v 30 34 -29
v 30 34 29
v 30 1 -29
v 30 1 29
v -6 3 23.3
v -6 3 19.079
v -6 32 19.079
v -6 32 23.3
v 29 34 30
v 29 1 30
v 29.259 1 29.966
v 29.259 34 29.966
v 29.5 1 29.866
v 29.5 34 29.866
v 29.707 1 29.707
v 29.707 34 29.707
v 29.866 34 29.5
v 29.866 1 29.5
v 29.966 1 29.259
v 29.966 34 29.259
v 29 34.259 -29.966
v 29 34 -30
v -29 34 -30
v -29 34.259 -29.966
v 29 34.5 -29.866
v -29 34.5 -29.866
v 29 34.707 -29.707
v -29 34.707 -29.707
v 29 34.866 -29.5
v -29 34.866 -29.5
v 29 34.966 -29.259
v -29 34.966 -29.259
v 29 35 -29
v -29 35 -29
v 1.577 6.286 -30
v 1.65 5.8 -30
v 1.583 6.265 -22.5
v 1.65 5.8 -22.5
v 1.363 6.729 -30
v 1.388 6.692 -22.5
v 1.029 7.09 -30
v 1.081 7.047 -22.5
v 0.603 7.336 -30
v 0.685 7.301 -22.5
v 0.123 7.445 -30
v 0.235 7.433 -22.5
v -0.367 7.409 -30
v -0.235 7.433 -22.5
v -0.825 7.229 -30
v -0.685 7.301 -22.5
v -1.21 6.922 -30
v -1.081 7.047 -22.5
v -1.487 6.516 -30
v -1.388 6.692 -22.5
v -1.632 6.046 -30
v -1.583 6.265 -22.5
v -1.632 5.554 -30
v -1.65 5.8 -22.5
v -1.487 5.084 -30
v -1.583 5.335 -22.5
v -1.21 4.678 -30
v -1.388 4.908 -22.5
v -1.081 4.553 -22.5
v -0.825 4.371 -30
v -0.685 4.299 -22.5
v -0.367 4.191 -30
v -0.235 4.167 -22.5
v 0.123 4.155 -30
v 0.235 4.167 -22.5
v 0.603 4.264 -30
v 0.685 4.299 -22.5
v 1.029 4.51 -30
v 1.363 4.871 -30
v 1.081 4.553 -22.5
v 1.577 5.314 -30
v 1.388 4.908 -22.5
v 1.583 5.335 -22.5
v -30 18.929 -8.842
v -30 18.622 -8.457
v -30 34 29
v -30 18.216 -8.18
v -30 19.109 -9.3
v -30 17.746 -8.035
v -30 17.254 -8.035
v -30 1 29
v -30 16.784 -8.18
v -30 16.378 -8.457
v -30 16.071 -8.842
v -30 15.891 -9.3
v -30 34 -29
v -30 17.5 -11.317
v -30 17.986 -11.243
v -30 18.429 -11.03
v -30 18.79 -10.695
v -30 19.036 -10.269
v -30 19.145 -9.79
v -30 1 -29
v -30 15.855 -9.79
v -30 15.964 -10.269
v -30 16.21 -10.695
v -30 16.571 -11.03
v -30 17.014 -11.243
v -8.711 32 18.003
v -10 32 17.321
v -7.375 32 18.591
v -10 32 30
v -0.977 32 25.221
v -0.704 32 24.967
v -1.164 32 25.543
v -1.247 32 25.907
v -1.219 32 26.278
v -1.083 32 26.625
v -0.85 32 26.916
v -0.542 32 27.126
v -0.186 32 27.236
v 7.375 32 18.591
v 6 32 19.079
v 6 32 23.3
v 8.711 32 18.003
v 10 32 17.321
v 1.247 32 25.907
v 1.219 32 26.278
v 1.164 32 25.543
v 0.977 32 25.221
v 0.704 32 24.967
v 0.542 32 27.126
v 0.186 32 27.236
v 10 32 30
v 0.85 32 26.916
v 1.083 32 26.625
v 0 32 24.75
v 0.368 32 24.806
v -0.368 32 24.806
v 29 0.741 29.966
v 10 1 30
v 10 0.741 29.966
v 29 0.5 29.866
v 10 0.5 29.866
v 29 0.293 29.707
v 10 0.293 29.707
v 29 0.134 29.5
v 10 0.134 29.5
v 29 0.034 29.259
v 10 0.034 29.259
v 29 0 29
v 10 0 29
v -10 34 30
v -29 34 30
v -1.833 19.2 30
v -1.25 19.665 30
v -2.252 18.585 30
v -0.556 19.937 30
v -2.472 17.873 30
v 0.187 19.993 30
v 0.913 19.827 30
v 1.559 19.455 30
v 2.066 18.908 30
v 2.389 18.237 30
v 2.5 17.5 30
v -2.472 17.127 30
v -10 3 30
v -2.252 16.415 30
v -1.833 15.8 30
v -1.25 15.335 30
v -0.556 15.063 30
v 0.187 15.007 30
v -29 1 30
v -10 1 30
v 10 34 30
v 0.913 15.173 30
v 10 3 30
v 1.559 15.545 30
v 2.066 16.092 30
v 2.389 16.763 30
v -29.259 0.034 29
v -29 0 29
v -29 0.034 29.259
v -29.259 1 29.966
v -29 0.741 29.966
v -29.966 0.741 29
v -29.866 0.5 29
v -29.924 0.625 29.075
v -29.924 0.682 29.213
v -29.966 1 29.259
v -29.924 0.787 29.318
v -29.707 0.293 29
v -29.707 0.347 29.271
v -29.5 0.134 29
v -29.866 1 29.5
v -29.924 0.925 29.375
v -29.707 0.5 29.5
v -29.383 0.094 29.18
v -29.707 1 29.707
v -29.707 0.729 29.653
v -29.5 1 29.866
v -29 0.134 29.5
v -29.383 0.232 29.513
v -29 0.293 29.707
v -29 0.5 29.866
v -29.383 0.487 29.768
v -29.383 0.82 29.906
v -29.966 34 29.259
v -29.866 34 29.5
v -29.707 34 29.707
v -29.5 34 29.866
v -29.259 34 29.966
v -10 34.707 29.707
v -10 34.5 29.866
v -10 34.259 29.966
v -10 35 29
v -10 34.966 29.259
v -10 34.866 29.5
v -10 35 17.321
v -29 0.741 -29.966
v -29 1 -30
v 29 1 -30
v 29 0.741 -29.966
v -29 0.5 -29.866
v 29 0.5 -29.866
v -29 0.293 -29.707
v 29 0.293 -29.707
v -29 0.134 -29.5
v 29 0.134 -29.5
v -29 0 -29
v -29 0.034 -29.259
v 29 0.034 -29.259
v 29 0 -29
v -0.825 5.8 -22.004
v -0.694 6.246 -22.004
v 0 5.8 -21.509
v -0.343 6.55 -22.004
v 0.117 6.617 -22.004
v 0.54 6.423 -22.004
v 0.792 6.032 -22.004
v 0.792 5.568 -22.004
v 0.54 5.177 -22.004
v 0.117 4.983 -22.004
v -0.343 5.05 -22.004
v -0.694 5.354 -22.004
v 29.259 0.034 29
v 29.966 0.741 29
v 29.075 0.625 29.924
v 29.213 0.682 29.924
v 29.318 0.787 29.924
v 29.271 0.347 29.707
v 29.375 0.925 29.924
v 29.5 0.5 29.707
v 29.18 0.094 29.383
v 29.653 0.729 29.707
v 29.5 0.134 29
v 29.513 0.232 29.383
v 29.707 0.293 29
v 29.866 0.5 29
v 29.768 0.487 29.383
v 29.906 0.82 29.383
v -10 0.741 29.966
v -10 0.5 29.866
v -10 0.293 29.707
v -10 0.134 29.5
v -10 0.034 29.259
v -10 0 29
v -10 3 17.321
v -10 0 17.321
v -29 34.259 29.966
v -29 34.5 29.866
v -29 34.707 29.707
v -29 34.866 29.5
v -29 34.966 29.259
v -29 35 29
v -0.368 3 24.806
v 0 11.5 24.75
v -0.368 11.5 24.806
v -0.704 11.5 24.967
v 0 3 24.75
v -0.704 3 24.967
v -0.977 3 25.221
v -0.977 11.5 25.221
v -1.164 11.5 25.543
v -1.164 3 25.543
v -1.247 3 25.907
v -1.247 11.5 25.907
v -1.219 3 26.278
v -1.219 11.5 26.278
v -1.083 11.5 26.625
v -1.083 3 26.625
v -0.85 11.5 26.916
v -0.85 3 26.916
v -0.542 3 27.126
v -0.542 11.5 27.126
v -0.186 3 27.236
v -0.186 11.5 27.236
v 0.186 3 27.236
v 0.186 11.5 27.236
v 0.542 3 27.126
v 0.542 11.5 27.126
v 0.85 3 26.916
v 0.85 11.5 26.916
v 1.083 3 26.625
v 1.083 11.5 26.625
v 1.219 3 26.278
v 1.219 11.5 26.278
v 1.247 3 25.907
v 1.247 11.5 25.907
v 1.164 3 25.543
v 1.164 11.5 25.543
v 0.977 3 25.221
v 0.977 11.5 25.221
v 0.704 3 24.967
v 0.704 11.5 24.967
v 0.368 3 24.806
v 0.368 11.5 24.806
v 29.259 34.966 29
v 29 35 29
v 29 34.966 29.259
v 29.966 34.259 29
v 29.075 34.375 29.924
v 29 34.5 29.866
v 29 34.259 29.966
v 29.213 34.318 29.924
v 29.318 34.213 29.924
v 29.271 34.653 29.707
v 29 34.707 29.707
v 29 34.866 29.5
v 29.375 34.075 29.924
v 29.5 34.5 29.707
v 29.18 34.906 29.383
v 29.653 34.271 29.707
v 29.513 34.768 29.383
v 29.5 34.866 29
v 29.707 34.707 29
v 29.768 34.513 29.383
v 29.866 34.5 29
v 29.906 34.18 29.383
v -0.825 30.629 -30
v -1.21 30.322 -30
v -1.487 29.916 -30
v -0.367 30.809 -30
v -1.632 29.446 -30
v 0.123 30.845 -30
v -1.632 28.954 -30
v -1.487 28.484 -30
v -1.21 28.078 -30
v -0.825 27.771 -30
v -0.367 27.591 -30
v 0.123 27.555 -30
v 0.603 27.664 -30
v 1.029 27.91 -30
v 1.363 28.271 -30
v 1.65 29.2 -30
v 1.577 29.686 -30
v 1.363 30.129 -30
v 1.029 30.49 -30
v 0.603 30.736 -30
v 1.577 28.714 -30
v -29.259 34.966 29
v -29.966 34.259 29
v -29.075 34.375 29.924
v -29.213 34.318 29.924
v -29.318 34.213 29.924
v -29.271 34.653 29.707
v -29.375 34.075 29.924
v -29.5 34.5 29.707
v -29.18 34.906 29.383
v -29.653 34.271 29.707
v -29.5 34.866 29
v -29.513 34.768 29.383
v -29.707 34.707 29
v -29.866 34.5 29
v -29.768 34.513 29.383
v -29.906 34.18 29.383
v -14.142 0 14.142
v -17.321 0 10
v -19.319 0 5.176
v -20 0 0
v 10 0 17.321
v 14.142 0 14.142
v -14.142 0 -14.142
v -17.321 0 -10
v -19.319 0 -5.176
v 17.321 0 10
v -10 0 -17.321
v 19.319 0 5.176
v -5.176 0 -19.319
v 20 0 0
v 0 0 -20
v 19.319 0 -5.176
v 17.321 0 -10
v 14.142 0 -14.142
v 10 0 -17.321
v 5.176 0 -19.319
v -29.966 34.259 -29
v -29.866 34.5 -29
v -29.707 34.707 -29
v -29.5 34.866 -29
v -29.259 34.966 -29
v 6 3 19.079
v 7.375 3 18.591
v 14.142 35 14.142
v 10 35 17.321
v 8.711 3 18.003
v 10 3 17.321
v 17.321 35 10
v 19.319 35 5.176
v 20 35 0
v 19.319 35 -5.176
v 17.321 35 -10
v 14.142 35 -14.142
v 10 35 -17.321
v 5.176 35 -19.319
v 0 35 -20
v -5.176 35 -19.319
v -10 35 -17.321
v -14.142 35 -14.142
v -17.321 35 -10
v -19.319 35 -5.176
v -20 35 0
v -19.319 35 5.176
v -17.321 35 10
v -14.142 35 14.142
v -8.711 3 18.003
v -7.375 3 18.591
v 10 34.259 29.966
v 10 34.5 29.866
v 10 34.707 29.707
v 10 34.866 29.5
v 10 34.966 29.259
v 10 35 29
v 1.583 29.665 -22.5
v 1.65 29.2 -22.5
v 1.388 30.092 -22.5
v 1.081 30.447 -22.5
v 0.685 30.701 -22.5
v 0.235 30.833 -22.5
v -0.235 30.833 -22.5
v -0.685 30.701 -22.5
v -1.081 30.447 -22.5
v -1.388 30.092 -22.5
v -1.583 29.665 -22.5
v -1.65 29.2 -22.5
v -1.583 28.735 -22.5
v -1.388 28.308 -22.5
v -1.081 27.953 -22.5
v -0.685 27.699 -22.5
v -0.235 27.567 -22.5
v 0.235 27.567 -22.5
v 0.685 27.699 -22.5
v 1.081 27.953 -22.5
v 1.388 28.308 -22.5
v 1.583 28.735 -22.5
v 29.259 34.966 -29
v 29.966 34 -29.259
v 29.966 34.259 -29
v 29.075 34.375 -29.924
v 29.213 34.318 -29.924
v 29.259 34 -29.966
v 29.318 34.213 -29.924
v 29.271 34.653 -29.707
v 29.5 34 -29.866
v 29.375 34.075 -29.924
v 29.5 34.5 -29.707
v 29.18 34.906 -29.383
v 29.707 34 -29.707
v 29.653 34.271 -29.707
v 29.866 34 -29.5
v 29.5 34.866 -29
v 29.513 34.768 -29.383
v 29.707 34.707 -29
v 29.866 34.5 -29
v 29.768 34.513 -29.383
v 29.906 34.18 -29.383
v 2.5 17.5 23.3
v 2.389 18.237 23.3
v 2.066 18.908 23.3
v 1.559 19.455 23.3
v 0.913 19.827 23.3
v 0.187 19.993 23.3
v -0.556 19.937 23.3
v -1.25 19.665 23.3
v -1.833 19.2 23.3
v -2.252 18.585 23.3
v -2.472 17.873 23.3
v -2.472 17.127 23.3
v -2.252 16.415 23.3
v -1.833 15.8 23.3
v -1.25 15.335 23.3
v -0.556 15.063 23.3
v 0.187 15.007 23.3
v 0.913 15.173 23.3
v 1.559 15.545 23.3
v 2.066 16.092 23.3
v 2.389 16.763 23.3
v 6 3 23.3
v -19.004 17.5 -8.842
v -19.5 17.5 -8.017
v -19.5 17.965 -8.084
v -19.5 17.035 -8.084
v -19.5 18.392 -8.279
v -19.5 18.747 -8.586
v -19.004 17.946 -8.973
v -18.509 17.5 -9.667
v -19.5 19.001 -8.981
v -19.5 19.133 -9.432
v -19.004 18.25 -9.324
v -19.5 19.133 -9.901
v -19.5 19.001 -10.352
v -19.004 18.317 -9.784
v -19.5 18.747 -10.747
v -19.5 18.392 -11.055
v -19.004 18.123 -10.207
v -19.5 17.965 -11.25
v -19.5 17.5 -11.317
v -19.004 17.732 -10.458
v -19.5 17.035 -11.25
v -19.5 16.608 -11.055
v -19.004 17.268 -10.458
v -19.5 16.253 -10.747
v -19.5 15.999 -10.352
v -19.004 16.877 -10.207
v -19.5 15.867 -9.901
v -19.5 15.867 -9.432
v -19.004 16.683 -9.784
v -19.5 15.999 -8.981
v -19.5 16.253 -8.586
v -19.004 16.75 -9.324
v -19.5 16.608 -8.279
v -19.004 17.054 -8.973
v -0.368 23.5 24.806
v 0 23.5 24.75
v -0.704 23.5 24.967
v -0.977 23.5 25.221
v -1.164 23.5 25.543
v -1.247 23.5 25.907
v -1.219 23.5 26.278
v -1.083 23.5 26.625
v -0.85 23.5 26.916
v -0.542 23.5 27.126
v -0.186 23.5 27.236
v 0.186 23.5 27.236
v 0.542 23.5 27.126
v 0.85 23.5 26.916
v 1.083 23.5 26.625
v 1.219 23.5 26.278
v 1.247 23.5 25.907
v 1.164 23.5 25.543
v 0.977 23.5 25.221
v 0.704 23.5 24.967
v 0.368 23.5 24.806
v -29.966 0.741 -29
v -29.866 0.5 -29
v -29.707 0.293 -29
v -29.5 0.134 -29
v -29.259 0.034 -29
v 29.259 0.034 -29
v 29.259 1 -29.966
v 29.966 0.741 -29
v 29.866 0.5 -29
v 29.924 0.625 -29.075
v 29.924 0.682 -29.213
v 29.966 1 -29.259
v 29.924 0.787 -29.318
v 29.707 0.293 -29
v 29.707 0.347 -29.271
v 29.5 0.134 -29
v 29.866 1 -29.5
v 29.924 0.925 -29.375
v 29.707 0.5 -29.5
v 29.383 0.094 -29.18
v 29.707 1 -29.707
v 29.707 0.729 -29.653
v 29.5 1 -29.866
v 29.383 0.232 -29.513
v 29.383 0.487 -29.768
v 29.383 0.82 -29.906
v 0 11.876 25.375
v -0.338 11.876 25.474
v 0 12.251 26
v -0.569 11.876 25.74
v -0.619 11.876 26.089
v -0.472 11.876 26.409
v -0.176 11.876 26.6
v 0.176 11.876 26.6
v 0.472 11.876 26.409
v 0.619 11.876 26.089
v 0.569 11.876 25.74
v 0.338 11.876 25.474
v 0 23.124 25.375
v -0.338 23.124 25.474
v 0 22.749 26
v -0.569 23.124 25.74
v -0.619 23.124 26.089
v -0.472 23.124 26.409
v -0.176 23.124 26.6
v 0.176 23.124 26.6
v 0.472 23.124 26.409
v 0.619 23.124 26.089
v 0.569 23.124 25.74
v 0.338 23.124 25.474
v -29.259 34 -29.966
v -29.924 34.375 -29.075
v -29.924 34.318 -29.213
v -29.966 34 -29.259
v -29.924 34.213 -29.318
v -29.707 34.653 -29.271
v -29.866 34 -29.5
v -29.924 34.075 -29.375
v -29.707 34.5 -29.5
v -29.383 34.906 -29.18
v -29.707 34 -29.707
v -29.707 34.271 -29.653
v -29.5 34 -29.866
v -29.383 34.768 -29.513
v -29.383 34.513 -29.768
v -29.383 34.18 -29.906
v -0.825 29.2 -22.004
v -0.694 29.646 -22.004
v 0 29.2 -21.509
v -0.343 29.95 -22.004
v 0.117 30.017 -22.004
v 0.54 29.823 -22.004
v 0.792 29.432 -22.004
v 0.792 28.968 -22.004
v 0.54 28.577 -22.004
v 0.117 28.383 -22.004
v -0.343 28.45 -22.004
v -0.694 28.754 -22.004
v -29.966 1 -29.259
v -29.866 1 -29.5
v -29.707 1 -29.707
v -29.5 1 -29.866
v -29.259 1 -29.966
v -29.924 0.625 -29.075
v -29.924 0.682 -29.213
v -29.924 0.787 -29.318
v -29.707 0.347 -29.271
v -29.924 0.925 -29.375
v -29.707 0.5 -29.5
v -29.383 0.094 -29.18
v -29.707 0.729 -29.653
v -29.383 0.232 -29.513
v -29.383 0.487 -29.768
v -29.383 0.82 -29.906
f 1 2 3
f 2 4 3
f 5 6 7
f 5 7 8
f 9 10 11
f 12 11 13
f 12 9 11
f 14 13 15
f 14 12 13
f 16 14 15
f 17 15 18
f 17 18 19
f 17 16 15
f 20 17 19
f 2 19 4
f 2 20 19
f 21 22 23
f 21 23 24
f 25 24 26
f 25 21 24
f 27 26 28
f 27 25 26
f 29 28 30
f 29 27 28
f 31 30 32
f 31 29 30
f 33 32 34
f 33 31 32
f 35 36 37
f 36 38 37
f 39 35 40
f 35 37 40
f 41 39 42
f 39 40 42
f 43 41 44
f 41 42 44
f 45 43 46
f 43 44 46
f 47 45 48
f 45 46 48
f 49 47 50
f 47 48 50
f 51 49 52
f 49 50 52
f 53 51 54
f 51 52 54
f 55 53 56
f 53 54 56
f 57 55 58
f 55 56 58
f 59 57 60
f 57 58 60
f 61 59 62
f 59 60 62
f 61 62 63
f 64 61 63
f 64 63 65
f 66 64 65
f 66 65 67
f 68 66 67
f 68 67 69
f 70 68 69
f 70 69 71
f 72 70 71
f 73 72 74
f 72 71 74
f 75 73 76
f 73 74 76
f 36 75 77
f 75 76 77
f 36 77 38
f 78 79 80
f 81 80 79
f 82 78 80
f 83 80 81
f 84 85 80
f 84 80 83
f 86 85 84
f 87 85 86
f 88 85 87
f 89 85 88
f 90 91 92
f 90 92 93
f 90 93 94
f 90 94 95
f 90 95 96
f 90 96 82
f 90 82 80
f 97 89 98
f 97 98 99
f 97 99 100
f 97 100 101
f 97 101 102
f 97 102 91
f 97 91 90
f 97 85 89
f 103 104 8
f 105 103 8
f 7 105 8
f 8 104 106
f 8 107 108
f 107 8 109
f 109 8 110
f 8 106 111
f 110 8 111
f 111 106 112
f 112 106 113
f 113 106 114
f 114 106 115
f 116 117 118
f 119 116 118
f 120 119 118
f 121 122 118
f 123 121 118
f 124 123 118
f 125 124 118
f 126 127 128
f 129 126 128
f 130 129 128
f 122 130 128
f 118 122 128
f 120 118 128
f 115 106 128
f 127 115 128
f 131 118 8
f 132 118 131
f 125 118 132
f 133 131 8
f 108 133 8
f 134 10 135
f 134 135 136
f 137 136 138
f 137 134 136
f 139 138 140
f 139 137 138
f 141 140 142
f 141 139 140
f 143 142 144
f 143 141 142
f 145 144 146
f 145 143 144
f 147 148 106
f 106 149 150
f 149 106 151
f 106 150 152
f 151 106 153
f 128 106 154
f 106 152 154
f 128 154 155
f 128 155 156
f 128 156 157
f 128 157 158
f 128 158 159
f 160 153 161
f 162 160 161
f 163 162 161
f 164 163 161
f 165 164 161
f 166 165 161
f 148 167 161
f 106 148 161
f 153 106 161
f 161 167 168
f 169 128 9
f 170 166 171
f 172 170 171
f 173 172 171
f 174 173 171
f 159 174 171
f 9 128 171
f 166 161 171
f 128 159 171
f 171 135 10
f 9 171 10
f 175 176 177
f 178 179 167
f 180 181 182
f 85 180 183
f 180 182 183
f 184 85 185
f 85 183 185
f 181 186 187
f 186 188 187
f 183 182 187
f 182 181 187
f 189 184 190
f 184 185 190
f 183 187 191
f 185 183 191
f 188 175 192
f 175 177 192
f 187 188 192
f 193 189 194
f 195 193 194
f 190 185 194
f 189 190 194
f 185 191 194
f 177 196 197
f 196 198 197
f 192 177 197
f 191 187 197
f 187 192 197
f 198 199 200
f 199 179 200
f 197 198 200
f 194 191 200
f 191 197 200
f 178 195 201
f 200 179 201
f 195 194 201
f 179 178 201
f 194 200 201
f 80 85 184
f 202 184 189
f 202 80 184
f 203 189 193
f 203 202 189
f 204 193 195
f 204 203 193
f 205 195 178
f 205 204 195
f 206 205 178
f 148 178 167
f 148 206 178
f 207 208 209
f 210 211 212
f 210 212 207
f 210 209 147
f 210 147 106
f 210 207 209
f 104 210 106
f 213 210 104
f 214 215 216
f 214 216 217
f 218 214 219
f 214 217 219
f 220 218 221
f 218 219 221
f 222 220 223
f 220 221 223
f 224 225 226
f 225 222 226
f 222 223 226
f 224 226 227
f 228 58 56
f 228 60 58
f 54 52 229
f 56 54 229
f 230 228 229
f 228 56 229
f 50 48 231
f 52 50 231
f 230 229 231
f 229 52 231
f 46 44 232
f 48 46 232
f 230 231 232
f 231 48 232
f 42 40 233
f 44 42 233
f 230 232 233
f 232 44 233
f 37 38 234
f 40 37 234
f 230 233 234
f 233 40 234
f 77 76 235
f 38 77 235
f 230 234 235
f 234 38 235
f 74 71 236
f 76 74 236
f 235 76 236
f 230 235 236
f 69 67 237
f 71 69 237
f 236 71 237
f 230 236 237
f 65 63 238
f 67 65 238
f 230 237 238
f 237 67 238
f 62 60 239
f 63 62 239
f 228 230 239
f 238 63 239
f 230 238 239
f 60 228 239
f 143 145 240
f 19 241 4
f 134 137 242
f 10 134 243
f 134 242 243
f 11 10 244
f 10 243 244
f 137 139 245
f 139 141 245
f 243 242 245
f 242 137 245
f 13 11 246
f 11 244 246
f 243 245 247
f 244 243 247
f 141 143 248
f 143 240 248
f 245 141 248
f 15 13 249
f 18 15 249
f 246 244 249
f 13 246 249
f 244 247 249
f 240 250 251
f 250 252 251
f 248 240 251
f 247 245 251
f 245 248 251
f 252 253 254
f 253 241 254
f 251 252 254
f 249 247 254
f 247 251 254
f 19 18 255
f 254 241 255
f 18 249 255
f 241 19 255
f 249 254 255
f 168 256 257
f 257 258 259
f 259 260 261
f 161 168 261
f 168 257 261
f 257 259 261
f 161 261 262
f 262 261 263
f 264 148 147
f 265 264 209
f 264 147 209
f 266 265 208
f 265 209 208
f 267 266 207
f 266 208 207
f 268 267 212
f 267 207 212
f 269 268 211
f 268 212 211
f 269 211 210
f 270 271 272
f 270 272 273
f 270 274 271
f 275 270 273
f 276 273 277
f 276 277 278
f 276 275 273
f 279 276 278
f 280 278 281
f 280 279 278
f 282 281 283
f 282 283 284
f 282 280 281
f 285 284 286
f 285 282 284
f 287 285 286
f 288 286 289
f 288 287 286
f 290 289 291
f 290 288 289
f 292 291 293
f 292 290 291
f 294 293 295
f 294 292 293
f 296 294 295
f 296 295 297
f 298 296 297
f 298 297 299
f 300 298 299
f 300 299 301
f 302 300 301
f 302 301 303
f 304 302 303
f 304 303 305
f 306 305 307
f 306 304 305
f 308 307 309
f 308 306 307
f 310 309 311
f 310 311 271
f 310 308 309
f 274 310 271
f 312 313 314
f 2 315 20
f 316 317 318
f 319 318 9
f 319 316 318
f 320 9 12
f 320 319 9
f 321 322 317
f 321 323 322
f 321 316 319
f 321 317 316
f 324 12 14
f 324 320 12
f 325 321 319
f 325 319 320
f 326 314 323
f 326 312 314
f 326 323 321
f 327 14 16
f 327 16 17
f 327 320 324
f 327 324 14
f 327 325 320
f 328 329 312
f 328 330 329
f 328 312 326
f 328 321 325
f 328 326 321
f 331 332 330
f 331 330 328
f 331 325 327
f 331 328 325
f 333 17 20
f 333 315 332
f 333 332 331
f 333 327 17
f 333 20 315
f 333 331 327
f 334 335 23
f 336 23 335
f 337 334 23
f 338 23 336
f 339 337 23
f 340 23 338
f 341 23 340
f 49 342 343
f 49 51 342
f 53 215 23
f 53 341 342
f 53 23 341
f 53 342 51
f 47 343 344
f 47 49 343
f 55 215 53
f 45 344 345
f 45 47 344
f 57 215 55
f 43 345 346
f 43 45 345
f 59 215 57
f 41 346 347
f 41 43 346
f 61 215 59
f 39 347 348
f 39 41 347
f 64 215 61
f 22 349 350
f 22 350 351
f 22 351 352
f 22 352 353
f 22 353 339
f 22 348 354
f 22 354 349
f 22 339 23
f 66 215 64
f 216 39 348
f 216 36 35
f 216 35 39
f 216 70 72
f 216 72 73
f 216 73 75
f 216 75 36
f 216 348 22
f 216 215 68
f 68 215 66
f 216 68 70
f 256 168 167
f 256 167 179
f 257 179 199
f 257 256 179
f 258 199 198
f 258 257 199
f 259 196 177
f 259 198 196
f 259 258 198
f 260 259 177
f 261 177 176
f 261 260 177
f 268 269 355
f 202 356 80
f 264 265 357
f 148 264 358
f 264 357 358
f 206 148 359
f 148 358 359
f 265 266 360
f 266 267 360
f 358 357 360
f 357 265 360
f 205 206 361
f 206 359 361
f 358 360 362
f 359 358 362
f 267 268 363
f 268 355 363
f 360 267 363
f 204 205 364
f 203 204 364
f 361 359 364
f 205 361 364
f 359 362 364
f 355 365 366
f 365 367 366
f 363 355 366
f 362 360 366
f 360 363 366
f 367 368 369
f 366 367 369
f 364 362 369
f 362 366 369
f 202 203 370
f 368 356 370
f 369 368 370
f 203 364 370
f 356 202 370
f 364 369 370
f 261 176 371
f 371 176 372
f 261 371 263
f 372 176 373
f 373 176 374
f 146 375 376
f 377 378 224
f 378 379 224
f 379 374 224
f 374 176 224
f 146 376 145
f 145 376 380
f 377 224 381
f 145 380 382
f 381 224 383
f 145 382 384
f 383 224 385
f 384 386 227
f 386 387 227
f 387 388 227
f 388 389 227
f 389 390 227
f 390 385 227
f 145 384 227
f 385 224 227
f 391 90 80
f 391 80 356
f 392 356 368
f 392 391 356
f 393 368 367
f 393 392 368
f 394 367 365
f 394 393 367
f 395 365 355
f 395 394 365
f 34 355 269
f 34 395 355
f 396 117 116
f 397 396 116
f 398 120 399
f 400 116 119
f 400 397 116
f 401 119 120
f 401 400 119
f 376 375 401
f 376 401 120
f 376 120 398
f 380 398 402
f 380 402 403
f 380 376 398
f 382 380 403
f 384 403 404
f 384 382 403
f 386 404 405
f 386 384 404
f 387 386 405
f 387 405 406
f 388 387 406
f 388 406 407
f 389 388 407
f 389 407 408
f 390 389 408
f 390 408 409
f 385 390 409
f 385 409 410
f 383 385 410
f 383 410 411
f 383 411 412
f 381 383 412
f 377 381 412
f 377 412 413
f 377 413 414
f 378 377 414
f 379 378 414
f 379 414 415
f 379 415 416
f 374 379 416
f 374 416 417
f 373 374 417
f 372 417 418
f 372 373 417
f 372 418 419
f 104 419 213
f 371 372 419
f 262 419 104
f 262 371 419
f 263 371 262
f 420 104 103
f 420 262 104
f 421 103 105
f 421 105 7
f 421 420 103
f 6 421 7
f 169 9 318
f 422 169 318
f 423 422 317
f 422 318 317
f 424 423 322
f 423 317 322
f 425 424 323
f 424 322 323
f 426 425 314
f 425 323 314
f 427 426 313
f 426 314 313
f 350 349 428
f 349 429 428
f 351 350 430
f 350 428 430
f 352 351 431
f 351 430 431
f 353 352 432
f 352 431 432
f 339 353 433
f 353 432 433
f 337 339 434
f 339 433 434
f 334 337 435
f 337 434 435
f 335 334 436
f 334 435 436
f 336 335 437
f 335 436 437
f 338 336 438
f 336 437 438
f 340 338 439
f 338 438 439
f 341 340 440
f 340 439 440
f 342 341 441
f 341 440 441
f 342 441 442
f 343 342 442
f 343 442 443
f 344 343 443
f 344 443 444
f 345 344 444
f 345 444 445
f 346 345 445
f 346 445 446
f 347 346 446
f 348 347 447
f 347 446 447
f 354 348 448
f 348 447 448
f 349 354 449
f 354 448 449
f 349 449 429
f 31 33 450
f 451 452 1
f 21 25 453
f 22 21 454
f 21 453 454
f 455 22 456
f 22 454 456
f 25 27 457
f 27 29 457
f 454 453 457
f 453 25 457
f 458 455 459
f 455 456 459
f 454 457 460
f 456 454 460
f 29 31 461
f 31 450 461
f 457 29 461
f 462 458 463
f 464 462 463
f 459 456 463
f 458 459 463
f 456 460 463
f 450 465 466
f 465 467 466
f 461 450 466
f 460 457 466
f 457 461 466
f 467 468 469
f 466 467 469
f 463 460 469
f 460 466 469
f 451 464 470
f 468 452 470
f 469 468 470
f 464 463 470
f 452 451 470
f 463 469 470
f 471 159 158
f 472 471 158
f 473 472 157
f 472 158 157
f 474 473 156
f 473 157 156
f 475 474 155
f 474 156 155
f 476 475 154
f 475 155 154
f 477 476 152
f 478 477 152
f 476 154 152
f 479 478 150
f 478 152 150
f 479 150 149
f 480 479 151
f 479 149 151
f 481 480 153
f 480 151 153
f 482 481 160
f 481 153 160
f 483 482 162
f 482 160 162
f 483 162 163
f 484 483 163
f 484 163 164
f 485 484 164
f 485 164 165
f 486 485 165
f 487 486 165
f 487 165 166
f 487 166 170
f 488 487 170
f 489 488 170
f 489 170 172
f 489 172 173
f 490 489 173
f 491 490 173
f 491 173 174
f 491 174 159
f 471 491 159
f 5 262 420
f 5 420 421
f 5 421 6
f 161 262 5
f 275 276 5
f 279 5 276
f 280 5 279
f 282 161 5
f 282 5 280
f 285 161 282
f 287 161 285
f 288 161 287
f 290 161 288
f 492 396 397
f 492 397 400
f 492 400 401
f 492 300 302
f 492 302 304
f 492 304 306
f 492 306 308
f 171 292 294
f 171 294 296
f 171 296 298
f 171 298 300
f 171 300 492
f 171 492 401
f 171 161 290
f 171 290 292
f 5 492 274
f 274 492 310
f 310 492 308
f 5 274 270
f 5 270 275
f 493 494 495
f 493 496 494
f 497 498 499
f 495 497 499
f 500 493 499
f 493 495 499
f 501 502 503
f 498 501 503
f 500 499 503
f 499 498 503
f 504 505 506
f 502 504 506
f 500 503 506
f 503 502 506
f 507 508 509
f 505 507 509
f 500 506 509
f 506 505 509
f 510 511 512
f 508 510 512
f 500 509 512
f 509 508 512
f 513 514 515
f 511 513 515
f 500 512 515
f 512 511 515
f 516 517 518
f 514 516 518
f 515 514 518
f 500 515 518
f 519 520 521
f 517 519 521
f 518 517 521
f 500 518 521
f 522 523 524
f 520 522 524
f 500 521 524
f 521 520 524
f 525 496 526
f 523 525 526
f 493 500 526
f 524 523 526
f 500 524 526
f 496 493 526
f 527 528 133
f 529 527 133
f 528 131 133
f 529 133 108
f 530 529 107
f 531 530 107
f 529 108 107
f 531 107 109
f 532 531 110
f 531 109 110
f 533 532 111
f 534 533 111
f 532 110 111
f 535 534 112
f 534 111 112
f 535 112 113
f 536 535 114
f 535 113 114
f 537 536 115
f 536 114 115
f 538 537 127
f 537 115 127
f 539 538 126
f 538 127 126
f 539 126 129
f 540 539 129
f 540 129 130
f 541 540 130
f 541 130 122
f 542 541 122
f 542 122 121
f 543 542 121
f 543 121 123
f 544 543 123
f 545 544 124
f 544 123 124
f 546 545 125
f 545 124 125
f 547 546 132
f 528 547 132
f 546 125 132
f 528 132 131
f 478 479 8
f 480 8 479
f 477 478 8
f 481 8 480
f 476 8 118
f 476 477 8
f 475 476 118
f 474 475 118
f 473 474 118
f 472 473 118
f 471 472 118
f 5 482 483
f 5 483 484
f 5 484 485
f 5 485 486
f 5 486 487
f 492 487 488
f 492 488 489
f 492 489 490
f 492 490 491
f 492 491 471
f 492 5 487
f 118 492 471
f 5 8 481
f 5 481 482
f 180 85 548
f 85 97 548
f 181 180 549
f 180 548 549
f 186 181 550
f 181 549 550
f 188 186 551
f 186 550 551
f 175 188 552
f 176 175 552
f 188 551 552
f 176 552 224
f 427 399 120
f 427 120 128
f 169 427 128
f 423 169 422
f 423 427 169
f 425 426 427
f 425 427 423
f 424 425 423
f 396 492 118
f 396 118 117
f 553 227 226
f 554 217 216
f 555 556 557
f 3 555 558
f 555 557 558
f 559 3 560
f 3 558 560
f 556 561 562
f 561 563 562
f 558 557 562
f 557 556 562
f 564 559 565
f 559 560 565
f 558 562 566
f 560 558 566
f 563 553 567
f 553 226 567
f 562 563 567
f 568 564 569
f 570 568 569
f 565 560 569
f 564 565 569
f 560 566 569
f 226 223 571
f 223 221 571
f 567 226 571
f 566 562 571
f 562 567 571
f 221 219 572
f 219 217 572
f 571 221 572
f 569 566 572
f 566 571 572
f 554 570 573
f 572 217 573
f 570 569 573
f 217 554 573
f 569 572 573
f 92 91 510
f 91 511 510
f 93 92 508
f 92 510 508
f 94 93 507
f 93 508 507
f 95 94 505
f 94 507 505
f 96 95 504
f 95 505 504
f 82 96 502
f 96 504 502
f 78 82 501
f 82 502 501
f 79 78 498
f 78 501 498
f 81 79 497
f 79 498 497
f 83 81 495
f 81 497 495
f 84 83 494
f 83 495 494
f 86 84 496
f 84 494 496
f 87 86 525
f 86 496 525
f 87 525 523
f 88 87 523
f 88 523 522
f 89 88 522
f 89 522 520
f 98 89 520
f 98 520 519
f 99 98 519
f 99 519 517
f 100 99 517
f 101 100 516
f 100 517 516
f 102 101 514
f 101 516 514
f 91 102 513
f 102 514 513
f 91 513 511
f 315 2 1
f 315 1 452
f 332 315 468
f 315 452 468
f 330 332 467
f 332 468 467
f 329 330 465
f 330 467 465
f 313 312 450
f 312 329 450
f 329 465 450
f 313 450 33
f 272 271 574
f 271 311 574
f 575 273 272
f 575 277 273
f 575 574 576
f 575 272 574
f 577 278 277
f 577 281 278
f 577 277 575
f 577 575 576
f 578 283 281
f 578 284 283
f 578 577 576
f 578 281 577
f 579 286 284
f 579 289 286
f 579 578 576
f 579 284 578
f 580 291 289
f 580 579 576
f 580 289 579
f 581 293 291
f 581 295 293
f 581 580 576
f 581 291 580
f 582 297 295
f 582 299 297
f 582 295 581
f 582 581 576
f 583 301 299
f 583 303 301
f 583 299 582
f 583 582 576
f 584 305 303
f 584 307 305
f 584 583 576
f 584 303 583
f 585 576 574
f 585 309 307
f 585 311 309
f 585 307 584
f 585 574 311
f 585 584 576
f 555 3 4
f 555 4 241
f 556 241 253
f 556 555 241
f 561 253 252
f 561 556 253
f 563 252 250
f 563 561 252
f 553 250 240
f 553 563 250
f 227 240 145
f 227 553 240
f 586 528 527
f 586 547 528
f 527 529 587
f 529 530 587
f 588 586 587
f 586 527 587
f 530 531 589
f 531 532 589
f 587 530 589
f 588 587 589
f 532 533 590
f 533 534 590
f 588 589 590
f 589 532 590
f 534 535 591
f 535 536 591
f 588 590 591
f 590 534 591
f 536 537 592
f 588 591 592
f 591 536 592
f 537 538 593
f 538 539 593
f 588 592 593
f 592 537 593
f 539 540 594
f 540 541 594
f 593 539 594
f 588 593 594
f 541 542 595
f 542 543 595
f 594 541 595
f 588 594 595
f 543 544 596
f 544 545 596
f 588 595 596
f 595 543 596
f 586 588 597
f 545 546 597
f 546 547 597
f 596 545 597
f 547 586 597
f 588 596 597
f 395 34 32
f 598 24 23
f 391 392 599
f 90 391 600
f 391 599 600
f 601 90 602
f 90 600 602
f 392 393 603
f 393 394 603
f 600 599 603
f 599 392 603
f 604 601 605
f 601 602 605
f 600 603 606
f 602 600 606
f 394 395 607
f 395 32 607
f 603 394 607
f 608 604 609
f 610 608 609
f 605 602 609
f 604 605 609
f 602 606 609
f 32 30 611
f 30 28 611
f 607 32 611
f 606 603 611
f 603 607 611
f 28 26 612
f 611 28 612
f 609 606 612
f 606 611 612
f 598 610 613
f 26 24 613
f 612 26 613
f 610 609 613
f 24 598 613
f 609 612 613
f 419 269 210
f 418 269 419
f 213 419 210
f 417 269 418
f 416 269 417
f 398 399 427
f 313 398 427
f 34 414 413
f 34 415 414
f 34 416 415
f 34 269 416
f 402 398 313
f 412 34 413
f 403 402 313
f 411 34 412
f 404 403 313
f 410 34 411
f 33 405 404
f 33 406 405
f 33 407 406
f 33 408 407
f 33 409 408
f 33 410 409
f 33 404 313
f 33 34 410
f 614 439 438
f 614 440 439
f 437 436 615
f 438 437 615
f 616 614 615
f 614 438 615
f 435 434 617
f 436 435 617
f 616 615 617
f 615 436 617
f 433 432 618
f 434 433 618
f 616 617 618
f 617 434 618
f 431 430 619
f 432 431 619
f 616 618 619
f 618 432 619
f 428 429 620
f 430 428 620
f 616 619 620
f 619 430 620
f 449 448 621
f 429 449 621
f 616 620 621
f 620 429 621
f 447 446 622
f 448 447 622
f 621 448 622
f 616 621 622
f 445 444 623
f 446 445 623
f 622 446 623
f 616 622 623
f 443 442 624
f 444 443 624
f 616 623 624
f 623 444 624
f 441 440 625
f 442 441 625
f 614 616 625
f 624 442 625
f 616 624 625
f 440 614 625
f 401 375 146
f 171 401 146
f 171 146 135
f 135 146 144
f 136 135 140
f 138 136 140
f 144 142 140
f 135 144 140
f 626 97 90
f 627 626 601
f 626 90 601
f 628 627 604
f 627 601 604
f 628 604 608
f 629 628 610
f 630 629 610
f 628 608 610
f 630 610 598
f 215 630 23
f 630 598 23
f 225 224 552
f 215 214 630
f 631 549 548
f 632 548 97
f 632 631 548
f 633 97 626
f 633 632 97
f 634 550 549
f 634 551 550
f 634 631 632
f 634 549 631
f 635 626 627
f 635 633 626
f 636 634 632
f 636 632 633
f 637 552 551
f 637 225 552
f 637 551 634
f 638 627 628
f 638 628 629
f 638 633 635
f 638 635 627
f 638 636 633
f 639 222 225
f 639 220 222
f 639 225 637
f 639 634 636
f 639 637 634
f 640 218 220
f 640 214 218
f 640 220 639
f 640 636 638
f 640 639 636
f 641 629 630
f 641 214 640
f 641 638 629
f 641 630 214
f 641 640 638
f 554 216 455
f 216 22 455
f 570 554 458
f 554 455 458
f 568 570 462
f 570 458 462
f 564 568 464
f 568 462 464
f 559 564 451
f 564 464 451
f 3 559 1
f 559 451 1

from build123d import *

# Parameters (mm, degrees)
ESQUISSE1_W             = 60
ESQUISSE1_H             = 60
ESQUISSE1_R             = 20
BOSS_EXTRU_1_DEPTH      = 35
CONG_1_R                = 1
TROU_TARAUD_M61_REACH   = 77.664
TROU_TARAUD_M61_BORE_R  = 2.5
TROU_TARAUD_M41_D       = 3.3
TROU_TARAUD_M41_DEPTH   = 7.5
TROU_TARAUD_M41_TIP     = 0.991420021
TROU_TARAUD_M42_D       = 3.3
TROU_TARAUD_M42_DEPTH   = 10.5
TROU_TARAUD_M42_TIP     = 0.991420021
ENL_V_MAT_EXTRU_1_REACH = 57
ENL_V_MAT_EXTRU_2_DEPTH = 3


with BuildPart() as part:
    # Esquisse1 → Boss.-Extru.1 (new body)
    with BuildSketch(Plane(origin=(0, 0, 0), x_dir=(1, 0, 0), z_dir=(0, 1, 0))):
        Rectangle(ESQUISSE1_W, ESQUISSE1_H)
        with Locations(Location((0, 0, 0), (0, 0, 270))):
            Circle(ESQUISSE1_R, mode=Mode.SUBTRACT)
    extrude(amount=BOSS_EXTRU_1_DEPTH)

    # Congé1
    cong_1_edges = [part.edges().sort_by_distance(p)[0] for p in [
        (30, 35, 0),
        (0, 35, -30),
        (-30, 35, 0),
        (0, 0, -30),
        (30, 0, 0),
        (0, 0, 30),
        (-30, 0, 0),
        (0, 35, 30),
        (-30, 17.5, -30),
        (30, 17.5, -30),
        (30, 17.5, 30),
        (-30, 17.5, 30),
    ]]
    fillet(cong_1_edges, radius=CONG_1_R)

    # Trou taraudé M61 bore → Trou taraudé M61 (cut, up to next)
    with BuildSketch(Plane.XY.offset(30), mode=Mode.PRIVATE) as trou_taraud_m61_sk1:
        with Locations((0, 17.5)):
            Circle(TROU_TARAUD_M61_BORE_R)
    trou_taraud_m61_tool1 = extrude(trou_taraud_m61_sk1.sketch, amount=-TROU_TARAUD_M61_REACH, mode=Mode.PRIVATE) & part.part
    add(trou_taraud_m61_tool1.solids().sort_by_distance((0, 17.5, 30))[0], mode=Mode.SUBTRACT)

    # Trou taraudé M41
    with Locations(Plane(origin=(0, 0, -30), x_dir=(-1, 0, 0), z_dir=(0, 0, -1))):
        with Locations((0, 29.2), (0, 5.8)):
            Hole(TROU_TARAUD_M41_D / 2, depth=TROU_TARAUD_M41_DEPTH)
            with Locations((0, 0, -(TROU_TARAUD_M41_DEPTH + TROU_TARAUD_M41_TIP / 2))):  # 118° drill point
                Cone(0, TROU_TARAUD_M41_D / 2, TROU_TARAUD_M41_TIP, mode=Mode.SUBTRACT)

    # Trou taraudé M42
    with Locations(Plane.ZY.offset(30)):
        with Locations((-9.666666667, 17.5)):
            Hole(TROU_TARAUD_M42_D / 2, depth=TROU_TARAUD_M42_DEPTH)
            with Locations((0, 0, -(TROU_TARAUD_M42_DEPTH + TROU_TARAUD_M42_TIP / 2))):  # 118° drill point
                Cone(0, TROU_TARAUD_M42_D / 2, TROU_TARAUD_M42_TIP, mode=Mode.SUBTRACT)

    # Esquisse10 → Enlèv. mat.-Extru.1 (cut, up to next)
    with BuildSketch(Plane.XZ, mode=Mode.PRIVATE) as enl_v_mat_extru_1_sk1:
        with BuildLine():
            Line((6, 23.3), (6, 19.078784028))
            ThreePointArc((6, 19.078784028), (0, 20), (-6, 19.078784028))
            Line((-6, 19.078784028), (-6, 23.3))
            Line((-6, 23.3), (6, 23.3))
        make_face()
    enl_v_mat_extru_1_tool1 = extrude(enl_v_mat_extru_1_sk1.sketch, amount=-ENL_V_MAT_EXTRU_1_REACH, mode=Mode.PRIVATE) & part.part
    add(enl_v_mat_extru_1_tool1.solids().sort_by_distance((0, 0, 21.487514))[0], mode=Mode.SUBTRACT)

    # Esquisse11 → Enlèv. mat.-Extru.2 (cut)
    with BuildSketch(Plane.XZ):
        with BuildLine():
            Line((-10, 30), (-10, 17.320508076))
            ThreePointArc((-10, 17.320508076), (0, 20), (10, 17.320508076))
            Line((10, 17.320508076), (10, 30))
            Line((10, 30), (-10, 30))
        make_face()
    enl_v_mat_extru_2 = extrude(amount=-ENL_V_MAT_EXTRU_2_DEPTH, mode=Mode.SUBTRACT)

    # Esquisse13 → Trou taraudé M31 (revolve, cut)
    with BuildSketch(Plane(origin=(0, 3, 26), x_dir=(0, 0, -1), z_dir=(1, 0, 0))):
        Polygon((0, 0), (0, 9.251075774), (1.25, 8.5), (1.25, 0), align=None)
    trou_taraud_m31 = revolve(axis=Axis((0, -3.35, 26), (0, 1, 0)), mode=Mode.SUBTRACT)

    # Symétrie1: Enlèv. mat.-Extru.2, Trou taraudé M31 across plane
    add(enl_v_mat_extru_2.mirror(Plane(origin=(0, 17.5, 0), x_dir=(0, 0, 1), z_dir=(0, -1, 0))), mode=Mode.SUBTRACT)
    add(trou_taraud_m31.mirror(Plane(origin=(0, 17.5, 0), x_dir=(0, 0, 1), z_dir=(0, -1, 0))), mode=Mode.SUBTRACT)


solid = part.part
